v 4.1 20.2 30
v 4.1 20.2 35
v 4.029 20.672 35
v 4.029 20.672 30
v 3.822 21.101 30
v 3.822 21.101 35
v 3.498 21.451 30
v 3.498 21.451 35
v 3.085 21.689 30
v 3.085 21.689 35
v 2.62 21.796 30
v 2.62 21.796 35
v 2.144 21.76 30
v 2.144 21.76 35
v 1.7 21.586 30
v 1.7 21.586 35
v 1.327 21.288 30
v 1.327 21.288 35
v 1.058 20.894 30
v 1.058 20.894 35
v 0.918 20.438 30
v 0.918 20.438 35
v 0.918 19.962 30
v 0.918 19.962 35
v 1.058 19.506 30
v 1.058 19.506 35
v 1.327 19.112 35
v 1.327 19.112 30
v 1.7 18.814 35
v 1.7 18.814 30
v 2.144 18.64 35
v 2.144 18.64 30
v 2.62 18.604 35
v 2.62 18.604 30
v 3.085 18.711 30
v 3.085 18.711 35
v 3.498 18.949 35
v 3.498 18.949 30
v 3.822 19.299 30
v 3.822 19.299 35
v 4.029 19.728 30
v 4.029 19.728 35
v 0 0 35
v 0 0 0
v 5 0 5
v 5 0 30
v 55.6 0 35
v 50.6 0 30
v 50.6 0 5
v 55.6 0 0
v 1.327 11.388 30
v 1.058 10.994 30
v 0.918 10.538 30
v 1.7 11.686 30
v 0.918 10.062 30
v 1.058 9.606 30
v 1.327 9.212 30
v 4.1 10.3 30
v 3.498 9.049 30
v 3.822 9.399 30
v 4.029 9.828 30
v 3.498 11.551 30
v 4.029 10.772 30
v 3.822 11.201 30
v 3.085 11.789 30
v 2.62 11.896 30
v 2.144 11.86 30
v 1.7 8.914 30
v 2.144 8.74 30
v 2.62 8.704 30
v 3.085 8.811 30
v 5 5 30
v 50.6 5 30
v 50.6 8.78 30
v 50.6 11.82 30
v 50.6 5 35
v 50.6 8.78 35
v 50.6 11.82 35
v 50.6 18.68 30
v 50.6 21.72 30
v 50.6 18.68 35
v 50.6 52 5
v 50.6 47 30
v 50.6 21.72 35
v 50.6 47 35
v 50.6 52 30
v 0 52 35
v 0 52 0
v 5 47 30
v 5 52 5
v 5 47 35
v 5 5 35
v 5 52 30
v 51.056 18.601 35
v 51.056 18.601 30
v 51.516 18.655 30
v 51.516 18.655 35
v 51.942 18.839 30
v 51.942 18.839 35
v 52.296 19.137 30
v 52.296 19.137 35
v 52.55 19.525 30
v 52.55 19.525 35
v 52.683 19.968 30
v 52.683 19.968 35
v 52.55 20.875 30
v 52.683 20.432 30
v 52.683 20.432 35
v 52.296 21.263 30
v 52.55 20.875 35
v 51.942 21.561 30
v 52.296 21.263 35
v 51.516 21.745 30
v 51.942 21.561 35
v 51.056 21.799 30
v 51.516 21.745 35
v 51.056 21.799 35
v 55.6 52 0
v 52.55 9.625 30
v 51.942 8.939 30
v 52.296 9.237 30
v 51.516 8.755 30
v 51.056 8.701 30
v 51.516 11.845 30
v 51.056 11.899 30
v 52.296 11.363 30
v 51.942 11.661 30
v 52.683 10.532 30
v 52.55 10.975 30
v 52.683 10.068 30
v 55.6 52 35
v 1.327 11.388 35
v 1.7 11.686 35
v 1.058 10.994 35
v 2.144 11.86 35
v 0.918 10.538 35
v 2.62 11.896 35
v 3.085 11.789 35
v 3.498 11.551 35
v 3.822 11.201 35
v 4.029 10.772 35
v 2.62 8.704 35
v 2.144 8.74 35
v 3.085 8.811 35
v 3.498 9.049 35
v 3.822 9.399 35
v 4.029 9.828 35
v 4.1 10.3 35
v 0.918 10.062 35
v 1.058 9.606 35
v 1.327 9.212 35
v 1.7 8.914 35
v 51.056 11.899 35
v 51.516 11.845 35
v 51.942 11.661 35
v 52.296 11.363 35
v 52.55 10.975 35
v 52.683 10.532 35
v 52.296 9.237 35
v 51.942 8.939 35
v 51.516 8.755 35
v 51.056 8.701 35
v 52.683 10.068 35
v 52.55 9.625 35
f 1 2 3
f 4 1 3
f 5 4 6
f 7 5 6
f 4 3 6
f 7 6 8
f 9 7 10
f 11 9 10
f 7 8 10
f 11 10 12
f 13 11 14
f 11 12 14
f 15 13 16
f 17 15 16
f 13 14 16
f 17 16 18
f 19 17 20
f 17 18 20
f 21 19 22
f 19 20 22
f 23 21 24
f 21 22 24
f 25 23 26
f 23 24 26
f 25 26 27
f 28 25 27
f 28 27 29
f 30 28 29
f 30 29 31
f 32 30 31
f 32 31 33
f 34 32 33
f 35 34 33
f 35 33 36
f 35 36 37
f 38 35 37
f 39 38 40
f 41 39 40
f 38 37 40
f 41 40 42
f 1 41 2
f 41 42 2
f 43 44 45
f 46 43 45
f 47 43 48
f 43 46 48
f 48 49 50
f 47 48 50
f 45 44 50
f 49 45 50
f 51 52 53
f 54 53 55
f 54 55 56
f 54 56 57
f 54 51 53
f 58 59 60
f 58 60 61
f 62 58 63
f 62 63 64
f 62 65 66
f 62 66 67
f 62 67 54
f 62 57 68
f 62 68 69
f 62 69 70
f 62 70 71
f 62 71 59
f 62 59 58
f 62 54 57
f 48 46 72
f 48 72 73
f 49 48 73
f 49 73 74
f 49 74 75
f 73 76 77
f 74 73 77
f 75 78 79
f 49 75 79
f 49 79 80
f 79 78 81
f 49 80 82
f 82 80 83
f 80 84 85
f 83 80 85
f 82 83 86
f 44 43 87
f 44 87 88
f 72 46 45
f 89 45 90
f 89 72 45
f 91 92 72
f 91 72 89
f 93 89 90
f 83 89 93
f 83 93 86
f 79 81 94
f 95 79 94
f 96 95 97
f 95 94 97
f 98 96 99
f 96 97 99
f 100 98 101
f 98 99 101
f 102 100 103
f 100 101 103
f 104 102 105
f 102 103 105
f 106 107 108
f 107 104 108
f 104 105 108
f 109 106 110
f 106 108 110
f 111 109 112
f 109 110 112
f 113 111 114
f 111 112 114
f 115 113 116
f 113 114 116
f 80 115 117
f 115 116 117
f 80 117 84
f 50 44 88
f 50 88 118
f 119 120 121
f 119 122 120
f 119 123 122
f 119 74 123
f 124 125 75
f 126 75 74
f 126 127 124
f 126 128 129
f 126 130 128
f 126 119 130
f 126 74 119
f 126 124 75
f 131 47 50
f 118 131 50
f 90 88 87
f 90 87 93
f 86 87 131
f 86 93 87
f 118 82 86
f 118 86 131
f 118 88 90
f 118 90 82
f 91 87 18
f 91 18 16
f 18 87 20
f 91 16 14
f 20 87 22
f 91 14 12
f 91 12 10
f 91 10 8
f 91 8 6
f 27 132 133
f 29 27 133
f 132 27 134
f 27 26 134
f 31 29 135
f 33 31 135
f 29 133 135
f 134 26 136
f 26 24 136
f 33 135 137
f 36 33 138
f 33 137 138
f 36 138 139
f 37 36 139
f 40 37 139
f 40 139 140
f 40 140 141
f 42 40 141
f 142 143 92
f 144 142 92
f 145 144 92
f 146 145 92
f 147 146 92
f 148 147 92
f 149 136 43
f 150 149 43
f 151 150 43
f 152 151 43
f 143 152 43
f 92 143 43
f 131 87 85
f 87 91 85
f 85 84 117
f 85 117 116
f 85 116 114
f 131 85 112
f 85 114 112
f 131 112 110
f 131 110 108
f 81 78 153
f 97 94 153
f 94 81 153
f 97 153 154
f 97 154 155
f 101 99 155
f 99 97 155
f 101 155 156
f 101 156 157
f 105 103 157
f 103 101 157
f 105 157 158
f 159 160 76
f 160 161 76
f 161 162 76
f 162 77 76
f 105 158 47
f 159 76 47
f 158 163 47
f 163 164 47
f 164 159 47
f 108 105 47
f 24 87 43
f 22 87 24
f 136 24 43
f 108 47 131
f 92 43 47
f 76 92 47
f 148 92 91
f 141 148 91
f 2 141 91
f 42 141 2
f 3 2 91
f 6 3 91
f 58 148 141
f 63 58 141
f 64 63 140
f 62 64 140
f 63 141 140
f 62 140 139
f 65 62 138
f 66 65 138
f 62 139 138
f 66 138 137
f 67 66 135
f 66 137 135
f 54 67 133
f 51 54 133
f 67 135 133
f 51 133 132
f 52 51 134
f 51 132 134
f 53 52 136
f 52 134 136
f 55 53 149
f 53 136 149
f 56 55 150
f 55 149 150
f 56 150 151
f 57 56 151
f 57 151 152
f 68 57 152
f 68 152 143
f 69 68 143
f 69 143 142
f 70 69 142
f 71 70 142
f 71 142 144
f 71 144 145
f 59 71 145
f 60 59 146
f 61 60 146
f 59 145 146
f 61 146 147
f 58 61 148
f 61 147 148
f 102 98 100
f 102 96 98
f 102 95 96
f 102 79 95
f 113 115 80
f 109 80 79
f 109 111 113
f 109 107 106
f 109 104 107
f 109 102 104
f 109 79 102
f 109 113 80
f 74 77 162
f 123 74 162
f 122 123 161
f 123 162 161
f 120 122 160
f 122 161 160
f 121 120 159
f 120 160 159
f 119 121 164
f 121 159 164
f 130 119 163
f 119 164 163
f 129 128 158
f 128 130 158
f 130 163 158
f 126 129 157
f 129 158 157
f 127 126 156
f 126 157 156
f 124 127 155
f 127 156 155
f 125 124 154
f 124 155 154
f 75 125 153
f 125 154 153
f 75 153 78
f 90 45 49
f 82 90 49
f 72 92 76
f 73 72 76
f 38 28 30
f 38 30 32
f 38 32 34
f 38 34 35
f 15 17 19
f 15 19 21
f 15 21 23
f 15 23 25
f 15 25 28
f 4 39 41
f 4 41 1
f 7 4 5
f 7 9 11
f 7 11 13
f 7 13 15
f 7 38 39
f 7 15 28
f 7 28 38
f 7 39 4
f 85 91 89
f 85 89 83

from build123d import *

# Parameters (mm, degrees)
SKETCH1_W           = 55.6
SKETCH1_H           = 35
SKETCH1_W_2         = 45.6
SKETCH1_H_2         = 25
BOSS_EXTRUDE1_DEPTH = 52
SKETCH2_W           = 45.6
SKETCH2_H           = 42
CUT_EXTRUDE1_DEPTH  = 5
SKETCH3_R           = 1.6
SKETCH3_W           = 40
SKETCH3_H           = 20.5
CUT_EXTRUDE2_DEPTH  = 5


with BuildPart() as part:
    # Sketch1 → Boss-Extrude1 (new body)
    with BuildSketch(Plane(origin=(0, 0, 0), x_dir=(1, 0, 0), z_dir=(0, 1, 0))):
        with Locations((27.8, -17.5)):
            Rectangle(SKETCH1_W, SKETCH1_H)
        with Locations((27.8, -17.5)):
            Rectangle(SKETCH1_W_2, SKETCH1_H_2, mode=Mode.SUBTRACT)
    extrude(amount=BOSS_EXTRUDE1_DEPTH)

    # Sketch2 → Cut-Extrude1 (cut)
    with BuildSketch(Plane.XY.offset(35)):
        with Locations((27.8, 26)):
            Rectangle(SKETCH2_W, SKETCH2_H)
    extrude(amount=-CUT_EXTRUDE1_DEPTH, mode=Mode.SUBTRACT)

    # Sketch3 → Cut-Extrude2 (cut)
    with BuildSketch(Plane.XY.offset(35)):
        with Locations((51.1, 20.2)):
            Circle(SKETCH3_R)
        with Locations((51.1, 10.3)):
            Circle(SKETCH3_R)
        with Locations((2.5, 10.3)):
            Circle(SKETCH3_R)
        with Locations((2.5, 20.2)):
            Circle(SKETCH3_R)
        with Locations((26.8, 15.25)):
            Rectangle(SKETCH3_W, SKETCH3_H)
    extrude(amount=-CUT_EXTRUDE2_DEPTH, mode=Mode.SUBTRACT)


solid = part.part
